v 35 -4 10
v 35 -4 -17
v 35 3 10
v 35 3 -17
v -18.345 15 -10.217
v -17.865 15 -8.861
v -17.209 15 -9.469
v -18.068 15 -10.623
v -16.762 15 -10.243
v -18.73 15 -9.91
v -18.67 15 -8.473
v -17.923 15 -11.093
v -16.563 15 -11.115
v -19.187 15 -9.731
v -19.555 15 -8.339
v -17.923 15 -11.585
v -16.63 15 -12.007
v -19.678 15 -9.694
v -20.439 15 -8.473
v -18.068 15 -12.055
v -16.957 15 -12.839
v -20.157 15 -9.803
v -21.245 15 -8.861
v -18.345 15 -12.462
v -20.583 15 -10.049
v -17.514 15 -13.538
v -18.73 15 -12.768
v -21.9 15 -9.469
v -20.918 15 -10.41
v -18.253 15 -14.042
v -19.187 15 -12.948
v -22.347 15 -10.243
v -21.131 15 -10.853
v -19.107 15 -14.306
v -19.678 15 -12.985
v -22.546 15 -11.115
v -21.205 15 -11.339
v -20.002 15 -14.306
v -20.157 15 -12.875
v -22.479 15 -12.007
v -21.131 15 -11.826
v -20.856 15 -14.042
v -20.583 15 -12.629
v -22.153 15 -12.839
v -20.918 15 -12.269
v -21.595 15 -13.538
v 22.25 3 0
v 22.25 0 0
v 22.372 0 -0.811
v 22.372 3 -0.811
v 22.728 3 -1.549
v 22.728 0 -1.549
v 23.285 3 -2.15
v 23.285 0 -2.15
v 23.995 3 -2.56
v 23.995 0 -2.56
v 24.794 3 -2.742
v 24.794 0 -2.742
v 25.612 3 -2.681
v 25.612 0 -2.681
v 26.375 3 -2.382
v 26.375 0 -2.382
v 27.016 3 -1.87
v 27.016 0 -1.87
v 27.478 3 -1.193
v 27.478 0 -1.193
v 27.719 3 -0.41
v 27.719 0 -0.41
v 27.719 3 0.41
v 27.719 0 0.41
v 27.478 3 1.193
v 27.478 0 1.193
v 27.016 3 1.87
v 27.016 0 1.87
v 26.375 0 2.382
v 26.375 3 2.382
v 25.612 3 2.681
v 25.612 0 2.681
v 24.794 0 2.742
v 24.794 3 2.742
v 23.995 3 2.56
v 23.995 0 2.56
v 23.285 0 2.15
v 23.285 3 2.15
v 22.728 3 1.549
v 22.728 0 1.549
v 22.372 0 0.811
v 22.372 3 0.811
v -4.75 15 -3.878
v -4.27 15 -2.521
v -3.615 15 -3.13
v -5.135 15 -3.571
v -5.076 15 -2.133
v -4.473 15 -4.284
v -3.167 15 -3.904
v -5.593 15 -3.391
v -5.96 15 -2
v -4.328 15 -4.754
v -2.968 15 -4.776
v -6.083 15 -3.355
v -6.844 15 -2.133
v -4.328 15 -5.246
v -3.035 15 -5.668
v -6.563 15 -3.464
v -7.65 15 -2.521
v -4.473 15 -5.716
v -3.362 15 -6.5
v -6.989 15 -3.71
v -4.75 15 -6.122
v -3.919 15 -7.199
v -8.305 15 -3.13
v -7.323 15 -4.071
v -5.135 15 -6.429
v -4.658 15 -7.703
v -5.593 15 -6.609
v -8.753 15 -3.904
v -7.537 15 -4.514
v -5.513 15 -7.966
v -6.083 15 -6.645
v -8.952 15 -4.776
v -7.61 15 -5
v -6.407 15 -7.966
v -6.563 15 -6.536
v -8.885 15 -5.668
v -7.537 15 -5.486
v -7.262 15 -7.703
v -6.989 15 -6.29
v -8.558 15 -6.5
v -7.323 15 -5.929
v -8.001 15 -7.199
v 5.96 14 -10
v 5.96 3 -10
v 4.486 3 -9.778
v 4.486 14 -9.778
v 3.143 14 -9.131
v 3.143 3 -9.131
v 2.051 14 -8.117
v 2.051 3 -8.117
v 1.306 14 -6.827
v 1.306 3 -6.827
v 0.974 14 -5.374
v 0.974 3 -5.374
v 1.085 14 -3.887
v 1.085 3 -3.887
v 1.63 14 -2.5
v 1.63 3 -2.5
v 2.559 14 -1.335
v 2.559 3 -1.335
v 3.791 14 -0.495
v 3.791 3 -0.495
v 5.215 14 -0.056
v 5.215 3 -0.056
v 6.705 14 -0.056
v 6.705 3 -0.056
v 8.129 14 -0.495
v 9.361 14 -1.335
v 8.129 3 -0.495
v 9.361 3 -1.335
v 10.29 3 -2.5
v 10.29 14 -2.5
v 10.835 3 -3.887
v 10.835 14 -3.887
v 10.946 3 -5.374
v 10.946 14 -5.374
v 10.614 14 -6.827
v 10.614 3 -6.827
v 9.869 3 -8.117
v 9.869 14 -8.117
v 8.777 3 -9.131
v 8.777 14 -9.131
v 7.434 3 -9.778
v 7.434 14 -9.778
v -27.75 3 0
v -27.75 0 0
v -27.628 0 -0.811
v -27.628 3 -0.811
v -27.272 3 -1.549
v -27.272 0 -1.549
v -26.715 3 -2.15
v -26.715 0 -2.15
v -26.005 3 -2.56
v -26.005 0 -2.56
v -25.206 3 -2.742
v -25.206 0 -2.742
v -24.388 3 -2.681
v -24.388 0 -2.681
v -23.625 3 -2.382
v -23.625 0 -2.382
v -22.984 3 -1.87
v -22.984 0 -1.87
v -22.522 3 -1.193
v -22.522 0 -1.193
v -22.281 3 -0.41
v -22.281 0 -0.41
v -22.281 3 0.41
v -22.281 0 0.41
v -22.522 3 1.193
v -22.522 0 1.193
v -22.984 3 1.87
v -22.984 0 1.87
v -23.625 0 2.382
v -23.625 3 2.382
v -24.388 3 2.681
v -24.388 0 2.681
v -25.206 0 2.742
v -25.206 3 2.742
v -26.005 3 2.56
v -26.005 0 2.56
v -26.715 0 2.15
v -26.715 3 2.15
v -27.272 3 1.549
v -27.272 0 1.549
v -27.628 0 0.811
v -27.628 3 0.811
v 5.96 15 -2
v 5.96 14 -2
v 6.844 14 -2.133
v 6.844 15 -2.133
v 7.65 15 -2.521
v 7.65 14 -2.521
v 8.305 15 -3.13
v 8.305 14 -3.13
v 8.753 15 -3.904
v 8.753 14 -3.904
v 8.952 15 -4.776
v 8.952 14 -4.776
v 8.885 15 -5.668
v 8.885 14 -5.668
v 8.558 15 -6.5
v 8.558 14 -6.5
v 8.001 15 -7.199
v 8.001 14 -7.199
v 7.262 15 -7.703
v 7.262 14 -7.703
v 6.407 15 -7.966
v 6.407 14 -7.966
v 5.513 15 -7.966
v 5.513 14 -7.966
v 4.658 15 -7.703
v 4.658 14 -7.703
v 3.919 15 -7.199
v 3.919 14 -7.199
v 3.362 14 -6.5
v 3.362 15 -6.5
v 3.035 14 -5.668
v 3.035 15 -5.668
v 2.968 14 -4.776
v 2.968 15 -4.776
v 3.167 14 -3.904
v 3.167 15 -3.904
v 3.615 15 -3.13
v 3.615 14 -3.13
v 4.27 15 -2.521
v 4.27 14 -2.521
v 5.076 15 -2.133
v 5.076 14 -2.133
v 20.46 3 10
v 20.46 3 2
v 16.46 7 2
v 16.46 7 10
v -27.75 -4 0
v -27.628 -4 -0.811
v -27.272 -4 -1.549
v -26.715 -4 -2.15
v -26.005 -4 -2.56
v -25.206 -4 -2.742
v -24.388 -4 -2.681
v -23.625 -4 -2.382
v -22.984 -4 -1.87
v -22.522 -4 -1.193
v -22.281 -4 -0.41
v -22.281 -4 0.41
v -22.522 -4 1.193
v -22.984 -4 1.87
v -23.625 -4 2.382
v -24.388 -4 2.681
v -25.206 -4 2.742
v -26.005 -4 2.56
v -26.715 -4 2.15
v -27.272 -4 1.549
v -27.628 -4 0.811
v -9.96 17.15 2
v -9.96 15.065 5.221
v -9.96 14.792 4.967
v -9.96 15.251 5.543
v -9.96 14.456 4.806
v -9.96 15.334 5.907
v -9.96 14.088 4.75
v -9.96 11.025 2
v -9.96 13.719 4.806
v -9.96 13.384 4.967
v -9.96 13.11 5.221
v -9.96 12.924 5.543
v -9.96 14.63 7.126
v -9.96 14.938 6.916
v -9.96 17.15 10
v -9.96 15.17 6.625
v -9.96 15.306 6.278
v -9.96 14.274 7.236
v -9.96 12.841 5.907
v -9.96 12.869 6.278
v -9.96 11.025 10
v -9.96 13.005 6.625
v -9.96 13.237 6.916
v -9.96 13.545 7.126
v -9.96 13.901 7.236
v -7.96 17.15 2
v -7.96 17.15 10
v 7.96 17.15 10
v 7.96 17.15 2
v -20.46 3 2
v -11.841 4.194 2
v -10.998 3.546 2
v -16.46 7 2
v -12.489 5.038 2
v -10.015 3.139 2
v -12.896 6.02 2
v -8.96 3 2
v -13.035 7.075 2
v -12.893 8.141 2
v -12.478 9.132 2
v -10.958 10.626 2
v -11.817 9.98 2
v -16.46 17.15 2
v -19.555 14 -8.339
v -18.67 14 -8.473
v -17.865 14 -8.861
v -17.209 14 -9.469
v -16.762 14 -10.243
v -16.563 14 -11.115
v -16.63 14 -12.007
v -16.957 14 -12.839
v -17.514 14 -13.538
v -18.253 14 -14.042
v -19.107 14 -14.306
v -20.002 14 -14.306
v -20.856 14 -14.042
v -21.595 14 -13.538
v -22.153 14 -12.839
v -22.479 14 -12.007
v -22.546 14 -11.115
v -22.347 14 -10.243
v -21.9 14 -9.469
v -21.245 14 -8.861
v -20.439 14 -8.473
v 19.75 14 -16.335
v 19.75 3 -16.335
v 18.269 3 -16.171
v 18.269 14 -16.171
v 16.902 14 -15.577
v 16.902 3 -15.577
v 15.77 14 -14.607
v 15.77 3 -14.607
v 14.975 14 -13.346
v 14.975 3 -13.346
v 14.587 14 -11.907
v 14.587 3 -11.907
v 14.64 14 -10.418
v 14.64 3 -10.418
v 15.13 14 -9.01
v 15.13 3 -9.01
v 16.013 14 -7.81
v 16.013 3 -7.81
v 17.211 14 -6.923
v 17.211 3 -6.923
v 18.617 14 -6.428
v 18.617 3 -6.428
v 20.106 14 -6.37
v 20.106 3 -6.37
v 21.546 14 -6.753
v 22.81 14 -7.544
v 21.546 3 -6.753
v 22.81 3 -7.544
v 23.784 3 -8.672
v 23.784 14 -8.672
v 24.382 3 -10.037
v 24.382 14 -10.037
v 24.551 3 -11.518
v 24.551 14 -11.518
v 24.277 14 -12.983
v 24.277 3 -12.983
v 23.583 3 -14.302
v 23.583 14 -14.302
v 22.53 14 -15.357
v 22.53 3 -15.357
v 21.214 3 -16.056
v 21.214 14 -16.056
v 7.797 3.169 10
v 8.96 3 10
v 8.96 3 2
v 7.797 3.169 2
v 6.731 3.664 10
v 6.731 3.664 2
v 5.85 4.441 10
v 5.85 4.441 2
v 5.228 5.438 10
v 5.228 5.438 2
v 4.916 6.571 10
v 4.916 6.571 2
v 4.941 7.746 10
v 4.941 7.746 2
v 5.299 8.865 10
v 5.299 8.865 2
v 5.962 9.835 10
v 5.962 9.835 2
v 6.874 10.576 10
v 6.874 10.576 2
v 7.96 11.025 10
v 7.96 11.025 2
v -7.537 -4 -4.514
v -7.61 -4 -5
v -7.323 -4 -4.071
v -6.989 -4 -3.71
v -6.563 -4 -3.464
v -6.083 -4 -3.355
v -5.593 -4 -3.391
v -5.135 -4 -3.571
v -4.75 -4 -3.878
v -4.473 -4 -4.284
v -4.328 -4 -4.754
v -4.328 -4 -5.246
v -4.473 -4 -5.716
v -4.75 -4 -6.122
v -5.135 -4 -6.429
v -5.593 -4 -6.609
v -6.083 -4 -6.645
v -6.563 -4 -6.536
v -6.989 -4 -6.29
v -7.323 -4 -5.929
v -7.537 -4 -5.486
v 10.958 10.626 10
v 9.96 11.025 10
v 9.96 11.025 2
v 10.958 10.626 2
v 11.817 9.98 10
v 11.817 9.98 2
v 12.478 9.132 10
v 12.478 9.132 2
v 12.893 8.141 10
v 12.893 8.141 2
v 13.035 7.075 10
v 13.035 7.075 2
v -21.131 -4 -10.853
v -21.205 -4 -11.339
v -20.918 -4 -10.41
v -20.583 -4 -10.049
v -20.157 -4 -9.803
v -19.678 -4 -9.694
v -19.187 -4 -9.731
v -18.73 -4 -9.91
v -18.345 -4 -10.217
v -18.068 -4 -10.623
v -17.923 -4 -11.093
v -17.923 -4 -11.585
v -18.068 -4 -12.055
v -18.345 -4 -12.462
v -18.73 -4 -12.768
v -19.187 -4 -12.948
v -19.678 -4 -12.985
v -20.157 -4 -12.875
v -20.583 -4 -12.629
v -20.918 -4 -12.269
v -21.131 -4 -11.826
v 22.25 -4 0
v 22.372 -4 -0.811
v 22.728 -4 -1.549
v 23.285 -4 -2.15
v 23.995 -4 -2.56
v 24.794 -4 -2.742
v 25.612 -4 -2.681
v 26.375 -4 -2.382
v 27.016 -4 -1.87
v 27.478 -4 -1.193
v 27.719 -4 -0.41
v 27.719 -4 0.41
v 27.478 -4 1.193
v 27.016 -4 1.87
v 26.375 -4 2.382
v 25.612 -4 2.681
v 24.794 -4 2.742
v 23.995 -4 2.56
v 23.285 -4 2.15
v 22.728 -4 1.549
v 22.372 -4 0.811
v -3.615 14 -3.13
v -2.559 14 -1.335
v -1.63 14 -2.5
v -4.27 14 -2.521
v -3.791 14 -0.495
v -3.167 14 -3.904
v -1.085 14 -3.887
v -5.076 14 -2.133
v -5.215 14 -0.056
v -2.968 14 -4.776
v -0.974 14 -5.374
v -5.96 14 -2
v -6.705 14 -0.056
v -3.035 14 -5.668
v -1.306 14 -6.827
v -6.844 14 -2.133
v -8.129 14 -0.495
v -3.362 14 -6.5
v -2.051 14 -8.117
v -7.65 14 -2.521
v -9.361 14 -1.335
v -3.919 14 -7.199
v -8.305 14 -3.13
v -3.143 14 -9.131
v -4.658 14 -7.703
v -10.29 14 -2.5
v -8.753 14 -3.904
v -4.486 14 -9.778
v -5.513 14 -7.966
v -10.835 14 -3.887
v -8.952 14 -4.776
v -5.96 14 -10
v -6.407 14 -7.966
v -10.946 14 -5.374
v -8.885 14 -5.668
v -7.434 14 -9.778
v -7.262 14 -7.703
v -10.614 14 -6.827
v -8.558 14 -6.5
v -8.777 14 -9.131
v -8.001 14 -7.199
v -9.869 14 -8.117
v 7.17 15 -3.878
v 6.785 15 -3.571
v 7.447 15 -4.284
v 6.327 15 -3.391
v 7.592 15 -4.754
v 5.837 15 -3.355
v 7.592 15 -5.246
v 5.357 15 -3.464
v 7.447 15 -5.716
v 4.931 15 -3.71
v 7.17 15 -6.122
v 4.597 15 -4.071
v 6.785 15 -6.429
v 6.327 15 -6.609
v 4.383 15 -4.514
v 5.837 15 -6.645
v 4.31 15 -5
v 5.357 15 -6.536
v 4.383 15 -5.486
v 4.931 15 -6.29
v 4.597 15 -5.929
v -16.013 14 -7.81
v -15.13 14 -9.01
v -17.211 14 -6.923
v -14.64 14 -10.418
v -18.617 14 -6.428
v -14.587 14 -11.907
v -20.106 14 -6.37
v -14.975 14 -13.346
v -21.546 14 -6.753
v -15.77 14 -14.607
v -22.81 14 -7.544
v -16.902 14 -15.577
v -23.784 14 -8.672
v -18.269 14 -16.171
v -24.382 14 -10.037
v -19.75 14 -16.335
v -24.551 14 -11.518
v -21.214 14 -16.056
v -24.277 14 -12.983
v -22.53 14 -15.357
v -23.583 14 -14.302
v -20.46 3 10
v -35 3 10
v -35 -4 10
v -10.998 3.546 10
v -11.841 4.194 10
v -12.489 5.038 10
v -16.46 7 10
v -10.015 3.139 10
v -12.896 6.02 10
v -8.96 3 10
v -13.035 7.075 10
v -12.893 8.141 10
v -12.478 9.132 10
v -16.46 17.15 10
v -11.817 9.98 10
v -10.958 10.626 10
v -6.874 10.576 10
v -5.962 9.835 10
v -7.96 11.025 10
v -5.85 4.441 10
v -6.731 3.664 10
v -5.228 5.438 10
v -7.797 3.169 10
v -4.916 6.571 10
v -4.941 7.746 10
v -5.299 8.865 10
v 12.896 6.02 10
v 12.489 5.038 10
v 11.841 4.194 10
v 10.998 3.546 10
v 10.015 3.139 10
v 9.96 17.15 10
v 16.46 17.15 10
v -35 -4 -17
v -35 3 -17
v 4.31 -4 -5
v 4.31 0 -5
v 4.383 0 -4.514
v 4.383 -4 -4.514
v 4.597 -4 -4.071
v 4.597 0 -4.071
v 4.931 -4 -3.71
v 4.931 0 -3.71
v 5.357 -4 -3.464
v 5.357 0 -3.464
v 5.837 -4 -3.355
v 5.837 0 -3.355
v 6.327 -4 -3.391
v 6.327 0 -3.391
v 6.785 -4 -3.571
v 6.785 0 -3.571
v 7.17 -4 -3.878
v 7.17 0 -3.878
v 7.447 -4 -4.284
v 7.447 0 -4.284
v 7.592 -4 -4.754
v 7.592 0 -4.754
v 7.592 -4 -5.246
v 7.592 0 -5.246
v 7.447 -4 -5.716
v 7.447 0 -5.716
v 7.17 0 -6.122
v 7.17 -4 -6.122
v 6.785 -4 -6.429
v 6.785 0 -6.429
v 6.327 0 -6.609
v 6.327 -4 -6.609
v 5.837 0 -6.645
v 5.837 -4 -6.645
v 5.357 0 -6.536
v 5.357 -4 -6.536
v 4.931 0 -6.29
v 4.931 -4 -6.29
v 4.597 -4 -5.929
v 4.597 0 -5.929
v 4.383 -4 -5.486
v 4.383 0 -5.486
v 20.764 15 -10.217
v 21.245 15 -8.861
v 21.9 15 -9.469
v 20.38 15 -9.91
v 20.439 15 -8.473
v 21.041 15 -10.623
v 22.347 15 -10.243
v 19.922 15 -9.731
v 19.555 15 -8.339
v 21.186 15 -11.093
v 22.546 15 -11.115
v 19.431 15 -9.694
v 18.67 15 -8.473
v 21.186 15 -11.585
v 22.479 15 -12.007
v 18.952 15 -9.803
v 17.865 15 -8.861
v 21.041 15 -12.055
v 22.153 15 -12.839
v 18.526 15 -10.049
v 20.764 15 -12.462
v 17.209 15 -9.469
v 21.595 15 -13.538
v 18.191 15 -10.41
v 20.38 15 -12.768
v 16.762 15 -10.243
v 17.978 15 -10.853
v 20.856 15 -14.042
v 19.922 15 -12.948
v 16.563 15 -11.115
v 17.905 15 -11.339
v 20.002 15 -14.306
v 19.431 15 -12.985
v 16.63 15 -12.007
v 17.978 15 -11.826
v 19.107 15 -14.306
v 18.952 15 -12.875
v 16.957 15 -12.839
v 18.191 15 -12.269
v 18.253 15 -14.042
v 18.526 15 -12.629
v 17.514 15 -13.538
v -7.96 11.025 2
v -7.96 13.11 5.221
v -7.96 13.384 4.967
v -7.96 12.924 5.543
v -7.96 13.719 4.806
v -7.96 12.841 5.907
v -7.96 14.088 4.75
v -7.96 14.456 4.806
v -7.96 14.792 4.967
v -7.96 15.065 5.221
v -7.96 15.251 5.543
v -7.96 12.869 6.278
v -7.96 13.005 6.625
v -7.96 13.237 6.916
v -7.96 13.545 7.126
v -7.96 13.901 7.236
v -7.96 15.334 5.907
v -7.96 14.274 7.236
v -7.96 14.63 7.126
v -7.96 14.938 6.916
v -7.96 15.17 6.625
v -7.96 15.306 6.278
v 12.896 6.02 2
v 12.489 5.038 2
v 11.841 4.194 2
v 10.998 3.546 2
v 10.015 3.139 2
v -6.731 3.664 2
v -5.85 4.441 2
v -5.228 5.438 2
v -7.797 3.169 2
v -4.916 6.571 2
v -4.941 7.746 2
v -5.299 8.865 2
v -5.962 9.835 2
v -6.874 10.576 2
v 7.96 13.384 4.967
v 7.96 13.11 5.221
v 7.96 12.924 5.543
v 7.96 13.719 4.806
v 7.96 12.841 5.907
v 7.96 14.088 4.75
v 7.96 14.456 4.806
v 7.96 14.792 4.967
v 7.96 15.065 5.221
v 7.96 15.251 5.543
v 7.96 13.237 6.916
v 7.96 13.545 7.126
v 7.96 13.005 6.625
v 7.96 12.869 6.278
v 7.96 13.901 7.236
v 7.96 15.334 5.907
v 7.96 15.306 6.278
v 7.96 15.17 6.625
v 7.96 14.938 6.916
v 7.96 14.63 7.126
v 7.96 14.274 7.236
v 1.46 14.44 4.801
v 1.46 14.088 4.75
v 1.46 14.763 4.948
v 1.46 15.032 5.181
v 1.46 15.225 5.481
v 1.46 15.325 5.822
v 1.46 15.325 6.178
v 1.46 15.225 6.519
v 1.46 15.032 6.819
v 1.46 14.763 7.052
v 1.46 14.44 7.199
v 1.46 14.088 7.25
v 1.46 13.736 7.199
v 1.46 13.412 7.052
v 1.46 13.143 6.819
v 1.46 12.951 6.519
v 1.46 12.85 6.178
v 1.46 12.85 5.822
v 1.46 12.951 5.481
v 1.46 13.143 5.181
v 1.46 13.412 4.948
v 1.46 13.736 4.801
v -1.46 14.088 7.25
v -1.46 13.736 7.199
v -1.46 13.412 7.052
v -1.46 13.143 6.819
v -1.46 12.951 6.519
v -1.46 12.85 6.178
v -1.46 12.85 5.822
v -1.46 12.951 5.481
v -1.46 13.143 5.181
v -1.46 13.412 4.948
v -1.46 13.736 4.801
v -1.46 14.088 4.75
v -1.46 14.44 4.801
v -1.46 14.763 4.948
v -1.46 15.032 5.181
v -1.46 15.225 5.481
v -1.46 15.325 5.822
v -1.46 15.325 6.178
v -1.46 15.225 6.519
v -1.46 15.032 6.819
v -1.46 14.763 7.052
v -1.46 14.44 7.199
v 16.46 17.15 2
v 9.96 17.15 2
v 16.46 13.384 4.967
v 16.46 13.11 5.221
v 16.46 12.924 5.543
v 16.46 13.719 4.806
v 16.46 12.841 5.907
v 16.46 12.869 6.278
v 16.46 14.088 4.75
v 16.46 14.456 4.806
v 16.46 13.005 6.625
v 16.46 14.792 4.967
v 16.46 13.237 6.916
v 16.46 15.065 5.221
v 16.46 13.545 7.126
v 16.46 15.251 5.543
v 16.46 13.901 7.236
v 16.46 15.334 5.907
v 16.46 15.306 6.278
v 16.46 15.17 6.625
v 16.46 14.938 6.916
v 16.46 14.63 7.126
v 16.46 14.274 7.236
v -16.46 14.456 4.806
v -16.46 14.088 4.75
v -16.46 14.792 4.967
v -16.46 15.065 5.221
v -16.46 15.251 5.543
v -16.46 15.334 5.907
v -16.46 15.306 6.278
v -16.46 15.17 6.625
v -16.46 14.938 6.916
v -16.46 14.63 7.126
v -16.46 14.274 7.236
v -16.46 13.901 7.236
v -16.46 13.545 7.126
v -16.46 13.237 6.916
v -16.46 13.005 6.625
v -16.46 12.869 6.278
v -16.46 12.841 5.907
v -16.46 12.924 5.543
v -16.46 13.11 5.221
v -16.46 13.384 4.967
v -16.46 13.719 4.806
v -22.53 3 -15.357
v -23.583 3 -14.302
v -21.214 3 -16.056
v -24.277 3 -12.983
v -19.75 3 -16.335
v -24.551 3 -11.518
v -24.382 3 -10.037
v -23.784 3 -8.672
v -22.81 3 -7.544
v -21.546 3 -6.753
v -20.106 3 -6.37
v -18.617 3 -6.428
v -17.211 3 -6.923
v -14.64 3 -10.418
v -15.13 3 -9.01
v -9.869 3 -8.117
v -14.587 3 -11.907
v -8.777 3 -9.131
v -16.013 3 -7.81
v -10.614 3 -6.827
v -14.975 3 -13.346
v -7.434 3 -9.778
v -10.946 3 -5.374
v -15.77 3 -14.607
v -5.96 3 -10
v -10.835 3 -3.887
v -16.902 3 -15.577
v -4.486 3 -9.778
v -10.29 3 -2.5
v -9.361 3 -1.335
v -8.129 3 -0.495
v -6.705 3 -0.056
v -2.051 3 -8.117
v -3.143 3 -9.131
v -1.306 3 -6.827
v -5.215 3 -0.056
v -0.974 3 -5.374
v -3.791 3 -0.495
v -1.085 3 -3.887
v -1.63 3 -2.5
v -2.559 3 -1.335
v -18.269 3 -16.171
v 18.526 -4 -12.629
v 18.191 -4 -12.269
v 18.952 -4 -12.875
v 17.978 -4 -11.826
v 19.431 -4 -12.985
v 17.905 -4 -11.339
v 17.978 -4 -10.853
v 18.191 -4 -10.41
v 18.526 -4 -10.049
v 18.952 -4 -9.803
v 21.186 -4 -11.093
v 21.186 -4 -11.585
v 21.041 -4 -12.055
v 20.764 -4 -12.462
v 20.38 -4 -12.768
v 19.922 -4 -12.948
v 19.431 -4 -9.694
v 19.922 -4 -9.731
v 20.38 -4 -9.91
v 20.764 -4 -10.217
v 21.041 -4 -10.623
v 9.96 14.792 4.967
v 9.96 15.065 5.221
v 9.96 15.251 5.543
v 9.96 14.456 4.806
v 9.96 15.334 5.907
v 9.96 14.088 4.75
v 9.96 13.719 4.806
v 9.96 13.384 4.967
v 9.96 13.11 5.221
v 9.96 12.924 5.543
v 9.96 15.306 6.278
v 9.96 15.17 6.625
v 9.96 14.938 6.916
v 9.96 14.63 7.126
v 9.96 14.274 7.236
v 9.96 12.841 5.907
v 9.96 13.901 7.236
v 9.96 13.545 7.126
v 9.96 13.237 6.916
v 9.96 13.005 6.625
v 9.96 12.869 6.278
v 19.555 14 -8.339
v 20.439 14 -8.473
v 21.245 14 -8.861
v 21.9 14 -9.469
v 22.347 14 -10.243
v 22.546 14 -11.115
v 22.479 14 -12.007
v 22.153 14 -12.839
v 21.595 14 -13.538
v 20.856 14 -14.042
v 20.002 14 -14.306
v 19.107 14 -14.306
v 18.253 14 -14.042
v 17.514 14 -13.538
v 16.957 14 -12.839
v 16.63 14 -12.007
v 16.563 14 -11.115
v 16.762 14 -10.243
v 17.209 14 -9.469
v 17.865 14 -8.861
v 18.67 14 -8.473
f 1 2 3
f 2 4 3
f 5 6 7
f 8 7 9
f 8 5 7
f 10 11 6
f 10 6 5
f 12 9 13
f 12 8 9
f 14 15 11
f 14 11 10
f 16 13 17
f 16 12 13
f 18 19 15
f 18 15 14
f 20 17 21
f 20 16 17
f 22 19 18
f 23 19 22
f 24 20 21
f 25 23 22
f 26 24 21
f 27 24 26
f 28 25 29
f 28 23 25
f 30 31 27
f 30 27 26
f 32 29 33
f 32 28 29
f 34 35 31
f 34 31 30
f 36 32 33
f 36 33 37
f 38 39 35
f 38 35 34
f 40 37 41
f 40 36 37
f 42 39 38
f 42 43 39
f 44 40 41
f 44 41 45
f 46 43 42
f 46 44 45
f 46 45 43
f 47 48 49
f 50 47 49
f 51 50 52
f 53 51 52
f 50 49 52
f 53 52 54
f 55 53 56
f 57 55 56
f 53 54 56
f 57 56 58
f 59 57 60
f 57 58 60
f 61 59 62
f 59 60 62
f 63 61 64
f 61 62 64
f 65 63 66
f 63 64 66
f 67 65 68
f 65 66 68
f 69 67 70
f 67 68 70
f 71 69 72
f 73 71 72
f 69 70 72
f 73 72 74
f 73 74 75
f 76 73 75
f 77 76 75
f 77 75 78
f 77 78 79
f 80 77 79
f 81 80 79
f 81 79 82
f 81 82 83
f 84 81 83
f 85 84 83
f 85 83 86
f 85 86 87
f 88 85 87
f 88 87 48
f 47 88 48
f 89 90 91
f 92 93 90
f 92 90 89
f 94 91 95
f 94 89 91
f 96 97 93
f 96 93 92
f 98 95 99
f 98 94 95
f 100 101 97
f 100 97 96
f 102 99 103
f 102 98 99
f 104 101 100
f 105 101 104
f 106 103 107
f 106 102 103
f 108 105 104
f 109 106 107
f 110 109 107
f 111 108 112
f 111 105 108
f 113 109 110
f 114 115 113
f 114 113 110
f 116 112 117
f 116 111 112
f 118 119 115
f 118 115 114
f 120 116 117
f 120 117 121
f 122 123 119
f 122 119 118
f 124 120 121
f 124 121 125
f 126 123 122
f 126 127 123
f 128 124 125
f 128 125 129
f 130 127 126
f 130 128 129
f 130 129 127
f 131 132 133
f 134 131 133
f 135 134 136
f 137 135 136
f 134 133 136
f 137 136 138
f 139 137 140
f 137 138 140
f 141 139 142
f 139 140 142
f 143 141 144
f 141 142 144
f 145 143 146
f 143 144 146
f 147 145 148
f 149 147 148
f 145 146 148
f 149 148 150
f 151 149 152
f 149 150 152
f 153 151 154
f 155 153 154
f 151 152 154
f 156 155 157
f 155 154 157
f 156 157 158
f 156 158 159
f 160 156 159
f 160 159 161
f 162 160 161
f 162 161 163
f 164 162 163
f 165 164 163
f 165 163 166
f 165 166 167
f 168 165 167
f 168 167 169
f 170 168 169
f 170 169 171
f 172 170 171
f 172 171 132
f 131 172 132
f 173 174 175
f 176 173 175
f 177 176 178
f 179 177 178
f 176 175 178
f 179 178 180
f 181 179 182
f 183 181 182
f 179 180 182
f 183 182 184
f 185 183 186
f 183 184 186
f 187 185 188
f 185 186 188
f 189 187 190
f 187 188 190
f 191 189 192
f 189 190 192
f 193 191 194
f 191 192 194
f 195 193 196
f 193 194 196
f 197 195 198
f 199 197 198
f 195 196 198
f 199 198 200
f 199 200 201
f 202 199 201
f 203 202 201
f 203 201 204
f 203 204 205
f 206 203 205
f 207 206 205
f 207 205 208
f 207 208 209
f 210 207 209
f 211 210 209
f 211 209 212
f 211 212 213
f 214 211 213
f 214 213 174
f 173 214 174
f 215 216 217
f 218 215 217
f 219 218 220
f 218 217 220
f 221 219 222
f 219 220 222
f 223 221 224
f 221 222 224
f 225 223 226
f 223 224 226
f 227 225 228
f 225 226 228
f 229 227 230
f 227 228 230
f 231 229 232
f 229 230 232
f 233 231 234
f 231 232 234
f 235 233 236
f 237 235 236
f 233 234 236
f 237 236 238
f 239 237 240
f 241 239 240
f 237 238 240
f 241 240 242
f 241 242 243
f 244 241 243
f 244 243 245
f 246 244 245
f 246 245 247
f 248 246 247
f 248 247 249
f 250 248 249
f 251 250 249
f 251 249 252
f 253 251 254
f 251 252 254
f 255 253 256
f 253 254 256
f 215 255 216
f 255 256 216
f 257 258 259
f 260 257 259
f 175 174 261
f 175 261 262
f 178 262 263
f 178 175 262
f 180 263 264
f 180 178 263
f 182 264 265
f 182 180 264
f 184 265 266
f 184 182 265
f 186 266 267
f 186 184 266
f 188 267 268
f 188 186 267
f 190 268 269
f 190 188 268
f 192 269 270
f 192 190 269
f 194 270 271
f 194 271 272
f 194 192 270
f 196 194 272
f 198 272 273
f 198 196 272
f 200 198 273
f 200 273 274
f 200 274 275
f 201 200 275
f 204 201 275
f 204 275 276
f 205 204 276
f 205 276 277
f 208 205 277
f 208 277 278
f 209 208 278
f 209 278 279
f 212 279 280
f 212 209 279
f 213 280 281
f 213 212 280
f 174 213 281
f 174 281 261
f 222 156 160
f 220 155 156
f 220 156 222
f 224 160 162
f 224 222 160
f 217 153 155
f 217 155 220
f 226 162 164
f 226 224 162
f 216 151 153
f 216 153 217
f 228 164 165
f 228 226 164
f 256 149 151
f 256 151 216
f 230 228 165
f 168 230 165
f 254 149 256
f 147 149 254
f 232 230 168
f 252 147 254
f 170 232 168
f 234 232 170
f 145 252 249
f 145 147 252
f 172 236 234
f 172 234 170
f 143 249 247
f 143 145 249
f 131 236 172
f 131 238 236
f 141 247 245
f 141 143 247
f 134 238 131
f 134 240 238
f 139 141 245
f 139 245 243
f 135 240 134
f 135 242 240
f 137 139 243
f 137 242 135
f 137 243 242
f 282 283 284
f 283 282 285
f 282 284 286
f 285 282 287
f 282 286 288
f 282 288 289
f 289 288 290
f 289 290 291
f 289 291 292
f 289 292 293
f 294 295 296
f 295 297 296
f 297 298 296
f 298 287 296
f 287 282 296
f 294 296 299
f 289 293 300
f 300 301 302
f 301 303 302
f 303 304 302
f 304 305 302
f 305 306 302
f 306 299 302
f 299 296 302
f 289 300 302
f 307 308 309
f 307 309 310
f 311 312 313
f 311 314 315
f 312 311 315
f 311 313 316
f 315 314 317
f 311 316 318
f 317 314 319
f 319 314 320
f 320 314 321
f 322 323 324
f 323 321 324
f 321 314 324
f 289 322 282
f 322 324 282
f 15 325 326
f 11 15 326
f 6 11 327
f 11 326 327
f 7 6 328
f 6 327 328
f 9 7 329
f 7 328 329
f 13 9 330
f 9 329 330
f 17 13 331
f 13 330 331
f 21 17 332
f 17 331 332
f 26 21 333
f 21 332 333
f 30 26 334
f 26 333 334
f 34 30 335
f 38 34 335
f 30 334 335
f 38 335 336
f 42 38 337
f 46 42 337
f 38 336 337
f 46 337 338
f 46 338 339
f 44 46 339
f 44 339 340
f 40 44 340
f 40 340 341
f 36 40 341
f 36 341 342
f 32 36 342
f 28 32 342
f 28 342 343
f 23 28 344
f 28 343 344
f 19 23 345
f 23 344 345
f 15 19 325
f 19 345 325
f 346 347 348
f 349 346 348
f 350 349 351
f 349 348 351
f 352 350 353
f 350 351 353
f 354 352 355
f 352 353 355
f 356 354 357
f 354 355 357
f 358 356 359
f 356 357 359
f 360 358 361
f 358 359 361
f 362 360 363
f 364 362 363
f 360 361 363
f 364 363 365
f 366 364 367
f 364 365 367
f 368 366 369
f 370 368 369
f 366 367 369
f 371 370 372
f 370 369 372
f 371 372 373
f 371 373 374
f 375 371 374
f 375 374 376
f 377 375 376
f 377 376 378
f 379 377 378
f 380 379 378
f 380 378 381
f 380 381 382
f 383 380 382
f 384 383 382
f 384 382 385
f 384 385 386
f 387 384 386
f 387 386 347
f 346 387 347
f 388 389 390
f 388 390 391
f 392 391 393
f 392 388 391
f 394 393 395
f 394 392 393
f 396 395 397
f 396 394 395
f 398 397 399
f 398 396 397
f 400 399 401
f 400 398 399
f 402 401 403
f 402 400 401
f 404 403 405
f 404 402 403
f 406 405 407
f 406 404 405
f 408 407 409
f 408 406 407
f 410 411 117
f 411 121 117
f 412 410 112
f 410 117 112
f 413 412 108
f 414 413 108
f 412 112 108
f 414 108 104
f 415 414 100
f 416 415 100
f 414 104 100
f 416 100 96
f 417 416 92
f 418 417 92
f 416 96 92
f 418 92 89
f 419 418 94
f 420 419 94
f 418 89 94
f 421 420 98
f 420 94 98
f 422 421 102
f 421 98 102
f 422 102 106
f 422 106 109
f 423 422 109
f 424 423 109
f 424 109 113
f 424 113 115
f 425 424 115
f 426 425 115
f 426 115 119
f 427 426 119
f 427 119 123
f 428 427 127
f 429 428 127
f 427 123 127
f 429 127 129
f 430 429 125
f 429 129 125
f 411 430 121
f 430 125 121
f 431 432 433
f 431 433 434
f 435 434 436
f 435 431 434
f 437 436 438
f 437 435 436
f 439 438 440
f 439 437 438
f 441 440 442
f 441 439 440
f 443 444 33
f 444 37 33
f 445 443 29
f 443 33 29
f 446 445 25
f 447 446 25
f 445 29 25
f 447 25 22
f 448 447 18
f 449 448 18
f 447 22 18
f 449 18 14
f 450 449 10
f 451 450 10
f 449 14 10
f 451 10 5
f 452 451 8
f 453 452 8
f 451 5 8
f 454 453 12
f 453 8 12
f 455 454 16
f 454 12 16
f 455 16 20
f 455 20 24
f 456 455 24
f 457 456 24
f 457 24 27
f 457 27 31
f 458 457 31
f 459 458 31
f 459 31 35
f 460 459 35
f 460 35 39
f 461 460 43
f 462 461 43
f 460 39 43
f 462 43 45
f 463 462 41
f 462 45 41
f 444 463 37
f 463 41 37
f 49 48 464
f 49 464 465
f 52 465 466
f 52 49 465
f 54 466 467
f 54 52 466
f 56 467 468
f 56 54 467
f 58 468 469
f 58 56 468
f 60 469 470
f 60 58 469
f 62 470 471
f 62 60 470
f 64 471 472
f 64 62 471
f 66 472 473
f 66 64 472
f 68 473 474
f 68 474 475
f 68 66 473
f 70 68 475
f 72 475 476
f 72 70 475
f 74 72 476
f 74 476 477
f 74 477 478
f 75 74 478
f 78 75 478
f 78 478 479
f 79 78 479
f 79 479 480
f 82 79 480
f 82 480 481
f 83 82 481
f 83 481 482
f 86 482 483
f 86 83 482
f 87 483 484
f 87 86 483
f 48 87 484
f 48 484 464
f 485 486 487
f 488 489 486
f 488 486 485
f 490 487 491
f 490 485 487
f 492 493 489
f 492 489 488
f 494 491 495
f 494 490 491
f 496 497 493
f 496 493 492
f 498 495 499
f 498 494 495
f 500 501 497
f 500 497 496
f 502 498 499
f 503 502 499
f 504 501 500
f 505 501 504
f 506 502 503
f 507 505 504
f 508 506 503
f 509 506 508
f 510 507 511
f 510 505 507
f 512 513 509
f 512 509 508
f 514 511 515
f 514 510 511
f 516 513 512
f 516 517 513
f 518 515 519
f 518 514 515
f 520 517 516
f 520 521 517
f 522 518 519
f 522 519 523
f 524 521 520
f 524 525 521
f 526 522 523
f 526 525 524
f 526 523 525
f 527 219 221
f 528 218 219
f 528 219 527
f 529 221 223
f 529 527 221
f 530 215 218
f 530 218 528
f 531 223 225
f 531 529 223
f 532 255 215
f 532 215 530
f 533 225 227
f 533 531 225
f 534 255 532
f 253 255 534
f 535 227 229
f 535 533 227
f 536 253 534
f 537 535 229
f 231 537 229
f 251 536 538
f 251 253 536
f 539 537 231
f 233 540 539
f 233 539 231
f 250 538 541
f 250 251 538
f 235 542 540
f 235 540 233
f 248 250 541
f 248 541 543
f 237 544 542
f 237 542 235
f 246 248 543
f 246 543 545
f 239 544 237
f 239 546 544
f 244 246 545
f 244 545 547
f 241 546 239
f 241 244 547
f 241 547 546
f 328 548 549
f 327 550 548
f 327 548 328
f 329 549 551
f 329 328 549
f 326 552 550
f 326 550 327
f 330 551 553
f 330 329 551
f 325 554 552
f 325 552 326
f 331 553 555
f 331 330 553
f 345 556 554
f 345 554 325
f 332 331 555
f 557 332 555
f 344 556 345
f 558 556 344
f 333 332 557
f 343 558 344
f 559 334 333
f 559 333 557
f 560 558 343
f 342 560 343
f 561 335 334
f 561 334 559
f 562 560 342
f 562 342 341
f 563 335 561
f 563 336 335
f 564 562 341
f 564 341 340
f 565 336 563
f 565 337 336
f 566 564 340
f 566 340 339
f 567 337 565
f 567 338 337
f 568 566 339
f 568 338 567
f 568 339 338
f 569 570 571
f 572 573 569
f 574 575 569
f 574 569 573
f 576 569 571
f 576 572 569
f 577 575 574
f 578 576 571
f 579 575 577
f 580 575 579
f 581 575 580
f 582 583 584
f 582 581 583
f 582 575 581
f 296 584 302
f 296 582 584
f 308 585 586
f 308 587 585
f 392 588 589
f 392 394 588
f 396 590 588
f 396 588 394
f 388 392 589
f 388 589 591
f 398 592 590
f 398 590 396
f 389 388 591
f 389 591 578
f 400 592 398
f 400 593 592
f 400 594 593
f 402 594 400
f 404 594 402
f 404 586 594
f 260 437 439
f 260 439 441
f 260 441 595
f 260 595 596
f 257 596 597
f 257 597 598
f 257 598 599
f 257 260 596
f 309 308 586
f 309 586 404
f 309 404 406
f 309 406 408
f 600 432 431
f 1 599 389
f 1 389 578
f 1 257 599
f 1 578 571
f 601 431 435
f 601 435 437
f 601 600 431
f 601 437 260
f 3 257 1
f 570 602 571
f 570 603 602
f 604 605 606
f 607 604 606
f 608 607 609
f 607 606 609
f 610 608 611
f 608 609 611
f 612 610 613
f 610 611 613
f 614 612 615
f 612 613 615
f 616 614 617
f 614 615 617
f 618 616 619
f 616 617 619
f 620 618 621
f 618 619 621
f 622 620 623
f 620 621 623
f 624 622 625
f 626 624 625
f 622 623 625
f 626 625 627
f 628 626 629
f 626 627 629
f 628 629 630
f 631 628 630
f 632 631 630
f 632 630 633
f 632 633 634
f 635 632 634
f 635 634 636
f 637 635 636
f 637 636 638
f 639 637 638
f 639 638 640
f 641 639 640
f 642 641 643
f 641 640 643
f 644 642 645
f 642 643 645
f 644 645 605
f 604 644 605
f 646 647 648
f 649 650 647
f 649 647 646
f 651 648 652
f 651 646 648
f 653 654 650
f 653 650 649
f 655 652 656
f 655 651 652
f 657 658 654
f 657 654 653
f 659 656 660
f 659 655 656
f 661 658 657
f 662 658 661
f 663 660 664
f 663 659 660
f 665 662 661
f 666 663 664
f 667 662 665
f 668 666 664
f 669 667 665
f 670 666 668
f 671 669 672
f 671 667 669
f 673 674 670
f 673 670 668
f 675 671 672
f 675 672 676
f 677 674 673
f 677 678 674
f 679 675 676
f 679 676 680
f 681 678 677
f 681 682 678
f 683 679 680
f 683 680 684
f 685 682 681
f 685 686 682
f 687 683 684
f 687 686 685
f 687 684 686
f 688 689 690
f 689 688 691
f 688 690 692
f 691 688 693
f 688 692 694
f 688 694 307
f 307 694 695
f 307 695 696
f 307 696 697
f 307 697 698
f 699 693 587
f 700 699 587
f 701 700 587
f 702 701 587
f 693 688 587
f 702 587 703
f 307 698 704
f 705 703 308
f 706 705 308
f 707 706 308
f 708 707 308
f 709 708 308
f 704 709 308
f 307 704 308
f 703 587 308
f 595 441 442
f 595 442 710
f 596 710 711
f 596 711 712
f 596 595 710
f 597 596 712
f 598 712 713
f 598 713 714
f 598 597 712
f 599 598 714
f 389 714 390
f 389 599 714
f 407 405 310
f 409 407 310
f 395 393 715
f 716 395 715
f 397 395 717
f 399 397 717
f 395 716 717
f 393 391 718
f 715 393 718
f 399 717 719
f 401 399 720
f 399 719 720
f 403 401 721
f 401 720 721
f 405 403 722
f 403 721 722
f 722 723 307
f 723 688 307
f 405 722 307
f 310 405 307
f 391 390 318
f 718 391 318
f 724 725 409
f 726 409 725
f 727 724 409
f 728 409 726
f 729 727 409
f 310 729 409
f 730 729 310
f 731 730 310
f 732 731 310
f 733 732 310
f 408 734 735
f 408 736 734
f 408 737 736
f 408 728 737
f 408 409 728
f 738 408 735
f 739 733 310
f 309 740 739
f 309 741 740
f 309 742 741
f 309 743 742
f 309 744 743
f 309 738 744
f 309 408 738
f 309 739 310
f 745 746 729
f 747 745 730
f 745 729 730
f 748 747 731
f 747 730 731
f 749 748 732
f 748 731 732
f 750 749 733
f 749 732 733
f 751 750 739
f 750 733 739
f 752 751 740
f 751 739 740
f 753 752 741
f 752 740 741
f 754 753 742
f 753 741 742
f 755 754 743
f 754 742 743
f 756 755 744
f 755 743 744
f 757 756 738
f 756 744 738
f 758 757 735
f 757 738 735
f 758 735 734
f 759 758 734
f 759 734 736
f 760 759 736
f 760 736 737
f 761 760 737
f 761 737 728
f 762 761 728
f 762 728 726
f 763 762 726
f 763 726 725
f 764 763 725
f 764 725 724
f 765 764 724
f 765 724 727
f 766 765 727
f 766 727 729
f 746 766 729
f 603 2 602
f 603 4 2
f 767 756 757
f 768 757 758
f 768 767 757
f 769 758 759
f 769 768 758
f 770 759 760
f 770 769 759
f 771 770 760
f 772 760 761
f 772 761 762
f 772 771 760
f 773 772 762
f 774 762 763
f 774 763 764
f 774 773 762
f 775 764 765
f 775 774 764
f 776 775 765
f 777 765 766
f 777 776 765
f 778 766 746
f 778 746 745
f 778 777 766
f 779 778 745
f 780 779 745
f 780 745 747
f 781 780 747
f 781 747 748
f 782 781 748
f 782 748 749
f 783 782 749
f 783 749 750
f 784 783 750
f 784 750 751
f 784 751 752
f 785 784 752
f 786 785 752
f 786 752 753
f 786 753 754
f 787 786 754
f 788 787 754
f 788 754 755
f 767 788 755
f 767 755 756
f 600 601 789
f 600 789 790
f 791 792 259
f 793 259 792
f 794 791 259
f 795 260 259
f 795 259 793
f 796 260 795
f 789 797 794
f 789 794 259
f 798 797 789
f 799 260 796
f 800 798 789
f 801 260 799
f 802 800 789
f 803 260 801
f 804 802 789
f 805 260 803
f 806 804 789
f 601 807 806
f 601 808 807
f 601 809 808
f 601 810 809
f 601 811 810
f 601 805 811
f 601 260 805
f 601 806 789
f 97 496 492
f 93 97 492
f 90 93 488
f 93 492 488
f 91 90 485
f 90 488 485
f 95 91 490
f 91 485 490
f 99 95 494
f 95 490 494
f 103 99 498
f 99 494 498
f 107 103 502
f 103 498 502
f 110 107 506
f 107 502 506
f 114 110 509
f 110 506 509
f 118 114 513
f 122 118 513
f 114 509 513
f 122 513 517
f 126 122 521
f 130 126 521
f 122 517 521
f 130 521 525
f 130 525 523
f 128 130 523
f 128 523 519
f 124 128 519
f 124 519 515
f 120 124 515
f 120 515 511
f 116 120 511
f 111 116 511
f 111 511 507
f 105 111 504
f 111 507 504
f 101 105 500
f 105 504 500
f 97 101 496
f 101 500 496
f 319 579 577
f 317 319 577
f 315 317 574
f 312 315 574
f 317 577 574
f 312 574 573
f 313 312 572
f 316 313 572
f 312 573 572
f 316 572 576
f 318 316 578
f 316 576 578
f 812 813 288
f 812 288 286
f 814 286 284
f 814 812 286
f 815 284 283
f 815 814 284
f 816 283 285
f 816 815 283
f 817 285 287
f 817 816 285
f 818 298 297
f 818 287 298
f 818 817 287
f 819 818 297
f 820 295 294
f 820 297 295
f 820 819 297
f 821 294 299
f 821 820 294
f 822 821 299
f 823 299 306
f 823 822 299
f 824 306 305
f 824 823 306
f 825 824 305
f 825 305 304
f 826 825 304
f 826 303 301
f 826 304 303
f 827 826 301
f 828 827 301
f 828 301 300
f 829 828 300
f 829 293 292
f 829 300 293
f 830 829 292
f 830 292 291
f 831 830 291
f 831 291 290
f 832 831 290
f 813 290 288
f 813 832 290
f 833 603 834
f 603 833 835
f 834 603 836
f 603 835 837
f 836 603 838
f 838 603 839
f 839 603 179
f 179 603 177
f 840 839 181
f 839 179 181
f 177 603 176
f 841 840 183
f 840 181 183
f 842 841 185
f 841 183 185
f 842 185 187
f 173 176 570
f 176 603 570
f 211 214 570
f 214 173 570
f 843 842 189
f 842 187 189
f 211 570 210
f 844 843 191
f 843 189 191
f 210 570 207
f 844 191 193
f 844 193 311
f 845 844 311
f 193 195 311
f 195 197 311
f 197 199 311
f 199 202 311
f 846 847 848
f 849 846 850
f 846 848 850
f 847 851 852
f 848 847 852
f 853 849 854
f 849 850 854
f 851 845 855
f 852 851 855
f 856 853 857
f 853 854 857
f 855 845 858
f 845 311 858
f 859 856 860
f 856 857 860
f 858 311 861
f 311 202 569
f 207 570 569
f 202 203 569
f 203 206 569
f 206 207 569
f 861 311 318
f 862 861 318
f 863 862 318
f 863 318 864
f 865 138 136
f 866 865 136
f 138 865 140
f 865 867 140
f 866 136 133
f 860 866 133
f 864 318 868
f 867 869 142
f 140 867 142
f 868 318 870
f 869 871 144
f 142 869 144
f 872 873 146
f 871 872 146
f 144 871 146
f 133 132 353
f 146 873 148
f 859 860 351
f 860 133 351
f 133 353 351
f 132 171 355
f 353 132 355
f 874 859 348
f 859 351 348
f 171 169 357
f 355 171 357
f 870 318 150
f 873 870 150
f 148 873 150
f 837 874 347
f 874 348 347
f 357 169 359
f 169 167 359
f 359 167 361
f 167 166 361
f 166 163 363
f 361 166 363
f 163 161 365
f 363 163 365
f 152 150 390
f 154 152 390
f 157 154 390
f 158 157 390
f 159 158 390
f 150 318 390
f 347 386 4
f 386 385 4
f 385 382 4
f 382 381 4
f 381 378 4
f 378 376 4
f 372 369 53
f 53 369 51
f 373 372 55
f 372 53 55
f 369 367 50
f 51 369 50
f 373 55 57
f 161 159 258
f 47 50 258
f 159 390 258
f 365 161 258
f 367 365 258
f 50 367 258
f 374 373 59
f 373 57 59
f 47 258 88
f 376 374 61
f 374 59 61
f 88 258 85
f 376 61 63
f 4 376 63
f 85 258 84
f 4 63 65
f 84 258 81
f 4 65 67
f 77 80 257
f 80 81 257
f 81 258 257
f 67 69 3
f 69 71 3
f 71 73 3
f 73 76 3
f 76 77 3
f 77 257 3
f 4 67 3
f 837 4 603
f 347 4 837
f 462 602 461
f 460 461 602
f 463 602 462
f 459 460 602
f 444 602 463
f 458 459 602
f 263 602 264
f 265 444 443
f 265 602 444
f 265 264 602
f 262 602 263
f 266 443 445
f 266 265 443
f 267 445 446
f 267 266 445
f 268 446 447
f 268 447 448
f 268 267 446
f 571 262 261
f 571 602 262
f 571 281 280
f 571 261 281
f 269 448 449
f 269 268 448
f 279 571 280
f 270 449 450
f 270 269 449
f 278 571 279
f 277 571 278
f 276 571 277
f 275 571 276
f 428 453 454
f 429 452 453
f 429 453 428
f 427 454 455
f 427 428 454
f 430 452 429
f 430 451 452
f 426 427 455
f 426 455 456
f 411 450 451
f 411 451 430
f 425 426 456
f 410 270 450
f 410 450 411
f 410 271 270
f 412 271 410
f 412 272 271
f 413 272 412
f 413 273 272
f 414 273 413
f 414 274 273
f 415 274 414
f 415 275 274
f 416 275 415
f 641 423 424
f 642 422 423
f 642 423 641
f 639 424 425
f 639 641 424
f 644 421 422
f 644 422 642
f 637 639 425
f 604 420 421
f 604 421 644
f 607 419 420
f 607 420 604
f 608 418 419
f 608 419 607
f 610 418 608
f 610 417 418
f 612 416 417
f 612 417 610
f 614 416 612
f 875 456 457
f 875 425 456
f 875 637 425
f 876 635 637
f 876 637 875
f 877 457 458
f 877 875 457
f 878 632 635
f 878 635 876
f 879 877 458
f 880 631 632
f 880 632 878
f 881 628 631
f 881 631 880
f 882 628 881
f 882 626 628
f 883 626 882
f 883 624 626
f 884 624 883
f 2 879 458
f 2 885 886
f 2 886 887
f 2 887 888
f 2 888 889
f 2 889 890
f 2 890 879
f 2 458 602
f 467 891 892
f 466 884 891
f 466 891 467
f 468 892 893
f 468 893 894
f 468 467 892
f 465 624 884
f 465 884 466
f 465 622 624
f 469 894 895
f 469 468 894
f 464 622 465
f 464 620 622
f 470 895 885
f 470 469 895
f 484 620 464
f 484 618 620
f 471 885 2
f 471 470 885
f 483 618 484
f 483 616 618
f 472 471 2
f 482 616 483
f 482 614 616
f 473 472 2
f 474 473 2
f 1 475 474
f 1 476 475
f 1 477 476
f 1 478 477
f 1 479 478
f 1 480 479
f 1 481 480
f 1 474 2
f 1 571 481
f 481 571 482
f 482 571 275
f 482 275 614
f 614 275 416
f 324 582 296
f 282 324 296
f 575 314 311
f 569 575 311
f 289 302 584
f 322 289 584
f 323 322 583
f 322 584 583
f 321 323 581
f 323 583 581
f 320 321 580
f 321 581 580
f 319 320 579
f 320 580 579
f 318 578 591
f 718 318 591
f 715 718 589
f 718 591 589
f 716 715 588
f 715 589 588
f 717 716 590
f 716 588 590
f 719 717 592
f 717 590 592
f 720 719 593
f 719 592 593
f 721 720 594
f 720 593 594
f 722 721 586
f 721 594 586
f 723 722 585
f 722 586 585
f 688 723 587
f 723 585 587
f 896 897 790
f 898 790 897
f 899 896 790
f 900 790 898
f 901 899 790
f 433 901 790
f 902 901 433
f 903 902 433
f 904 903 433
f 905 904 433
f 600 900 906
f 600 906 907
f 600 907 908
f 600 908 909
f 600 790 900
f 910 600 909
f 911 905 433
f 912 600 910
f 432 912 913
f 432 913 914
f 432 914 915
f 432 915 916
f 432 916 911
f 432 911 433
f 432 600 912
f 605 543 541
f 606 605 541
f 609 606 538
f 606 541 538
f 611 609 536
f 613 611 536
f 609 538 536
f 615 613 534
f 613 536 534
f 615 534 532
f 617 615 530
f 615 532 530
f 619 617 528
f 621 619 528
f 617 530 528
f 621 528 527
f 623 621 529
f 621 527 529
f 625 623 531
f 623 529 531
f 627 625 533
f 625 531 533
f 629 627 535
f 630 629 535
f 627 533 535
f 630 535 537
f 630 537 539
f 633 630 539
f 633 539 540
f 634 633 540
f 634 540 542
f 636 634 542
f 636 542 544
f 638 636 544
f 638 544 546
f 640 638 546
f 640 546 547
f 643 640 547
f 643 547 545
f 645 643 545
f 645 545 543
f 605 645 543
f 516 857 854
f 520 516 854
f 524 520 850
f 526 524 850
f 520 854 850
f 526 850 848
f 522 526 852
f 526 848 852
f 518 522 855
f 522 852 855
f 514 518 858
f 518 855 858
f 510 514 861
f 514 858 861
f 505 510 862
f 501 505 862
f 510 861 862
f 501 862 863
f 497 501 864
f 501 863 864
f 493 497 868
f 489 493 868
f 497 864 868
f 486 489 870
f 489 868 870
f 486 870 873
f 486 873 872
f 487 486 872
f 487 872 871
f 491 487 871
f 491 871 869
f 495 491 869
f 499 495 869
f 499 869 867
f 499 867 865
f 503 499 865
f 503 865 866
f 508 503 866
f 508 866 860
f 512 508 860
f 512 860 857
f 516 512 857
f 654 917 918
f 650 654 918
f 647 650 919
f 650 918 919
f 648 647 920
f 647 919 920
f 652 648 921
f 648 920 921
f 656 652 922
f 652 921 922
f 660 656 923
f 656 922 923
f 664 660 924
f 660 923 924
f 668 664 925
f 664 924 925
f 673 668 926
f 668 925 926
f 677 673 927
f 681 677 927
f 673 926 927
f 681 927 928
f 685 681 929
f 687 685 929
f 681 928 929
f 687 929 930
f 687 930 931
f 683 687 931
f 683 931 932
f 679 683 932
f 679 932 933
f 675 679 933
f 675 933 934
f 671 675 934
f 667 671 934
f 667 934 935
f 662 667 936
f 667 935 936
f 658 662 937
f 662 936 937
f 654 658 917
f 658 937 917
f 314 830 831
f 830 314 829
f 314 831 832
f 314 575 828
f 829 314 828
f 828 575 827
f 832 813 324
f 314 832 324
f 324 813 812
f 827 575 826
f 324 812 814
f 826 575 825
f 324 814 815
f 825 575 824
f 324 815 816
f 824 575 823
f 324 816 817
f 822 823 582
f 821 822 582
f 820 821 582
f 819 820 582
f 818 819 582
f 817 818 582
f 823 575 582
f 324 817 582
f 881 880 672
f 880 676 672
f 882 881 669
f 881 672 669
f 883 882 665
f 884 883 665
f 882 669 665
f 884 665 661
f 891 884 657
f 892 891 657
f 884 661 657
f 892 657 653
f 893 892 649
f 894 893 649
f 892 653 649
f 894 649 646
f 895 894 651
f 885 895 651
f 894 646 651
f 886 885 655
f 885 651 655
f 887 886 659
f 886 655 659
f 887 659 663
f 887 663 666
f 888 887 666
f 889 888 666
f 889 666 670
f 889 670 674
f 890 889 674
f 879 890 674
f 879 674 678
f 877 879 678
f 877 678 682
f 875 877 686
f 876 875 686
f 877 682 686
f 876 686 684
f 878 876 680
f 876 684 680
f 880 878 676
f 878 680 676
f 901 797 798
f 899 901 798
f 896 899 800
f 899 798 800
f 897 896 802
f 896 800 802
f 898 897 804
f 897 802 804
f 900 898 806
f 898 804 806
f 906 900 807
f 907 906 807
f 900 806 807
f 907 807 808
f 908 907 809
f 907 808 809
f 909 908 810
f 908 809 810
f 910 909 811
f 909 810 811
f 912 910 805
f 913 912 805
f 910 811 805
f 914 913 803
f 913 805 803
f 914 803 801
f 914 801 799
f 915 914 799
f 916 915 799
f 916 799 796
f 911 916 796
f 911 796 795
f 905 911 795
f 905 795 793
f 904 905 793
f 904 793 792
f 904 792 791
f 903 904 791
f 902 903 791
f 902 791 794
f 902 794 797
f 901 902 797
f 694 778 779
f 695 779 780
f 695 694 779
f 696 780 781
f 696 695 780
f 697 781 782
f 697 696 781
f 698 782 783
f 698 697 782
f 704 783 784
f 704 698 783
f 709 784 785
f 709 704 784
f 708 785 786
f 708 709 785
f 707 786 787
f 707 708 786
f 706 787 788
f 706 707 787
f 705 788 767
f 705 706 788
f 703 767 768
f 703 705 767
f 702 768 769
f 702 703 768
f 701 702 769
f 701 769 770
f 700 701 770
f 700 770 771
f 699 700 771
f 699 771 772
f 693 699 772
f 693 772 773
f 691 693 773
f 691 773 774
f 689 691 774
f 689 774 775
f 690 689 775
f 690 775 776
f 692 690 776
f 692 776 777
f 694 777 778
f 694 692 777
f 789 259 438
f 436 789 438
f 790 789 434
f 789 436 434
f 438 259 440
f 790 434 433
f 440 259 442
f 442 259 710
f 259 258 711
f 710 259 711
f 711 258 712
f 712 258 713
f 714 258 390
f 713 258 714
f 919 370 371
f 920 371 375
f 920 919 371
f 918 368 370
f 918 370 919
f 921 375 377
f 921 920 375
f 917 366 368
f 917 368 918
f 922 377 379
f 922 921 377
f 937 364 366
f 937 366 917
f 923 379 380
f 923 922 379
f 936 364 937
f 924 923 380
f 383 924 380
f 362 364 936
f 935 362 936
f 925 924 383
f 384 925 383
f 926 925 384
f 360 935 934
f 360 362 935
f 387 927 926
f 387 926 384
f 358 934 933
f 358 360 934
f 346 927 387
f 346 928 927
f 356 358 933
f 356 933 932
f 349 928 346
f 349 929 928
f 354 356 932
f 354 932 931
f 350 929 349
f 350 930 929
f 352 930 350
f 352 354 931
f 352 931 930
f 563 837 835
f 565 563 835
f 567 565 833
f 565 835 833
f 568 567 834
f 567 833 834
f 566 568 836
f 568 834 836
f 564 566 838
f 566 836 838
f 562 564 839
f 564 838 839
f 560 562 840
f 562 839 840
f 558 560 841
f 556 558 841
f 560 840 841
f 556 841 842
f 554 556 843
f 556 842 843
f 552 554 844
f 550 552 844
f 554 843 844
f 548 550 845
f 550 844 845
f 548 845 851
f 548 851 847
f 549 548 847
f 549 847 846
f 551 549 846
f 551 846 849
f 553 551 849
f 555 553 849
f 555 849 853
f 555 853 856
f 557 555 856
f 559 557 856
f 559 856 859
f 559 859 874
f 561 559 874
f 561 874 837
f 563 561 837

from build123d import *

# Parameters (mm, degrees)
BOSS_EXTRUDE1_DEPTH      = 3
BOSS_EXTRUDE2_DEPTH      = 8
CHAMFER1_SIZE            = 4
M3X0_5_TAPPED_HOLE1_D    = 2.5
CHAMFER1_OF_MIRROR1_SIZE = 4
BOSS_EXTRUDE3_REACH      = 34.14
SKETCH7_W                = 8
SKETCH7_H                = 14.15
SKETCH7_R                = 1.25
SKETCH8_R                = 5
BOSS_EXTRUDE4_DEPTH      = 12
CUT_EXTRUDE1_START       = -1
SKETCH9_R                = 5
SKETCH9_R_2              = 3
CUT_EXTRUDE1_DEPTH       = 1
SKETCH12_W               = 15.25
SKETCH12_H               = 27
BOSS_EXTRUDE5_DEPTH      = 3
M4X0_7_TAPPED_HOLE1_D    = 3.3
M5_CLEARANCE_HOLE3_D     = 5.5
DELETEFACE1_START        = 2
DELETEFACE1_DEPTH        = 8
MOVE_FACE1_BY            = 4


# Read off the part's stored shape, not the designer's step: DeleteFace1
with BuildPart() as part:
    # Sketch1 → Boss-Extrude1 (new body)
    with BuildSketch(Plane(origin=(0, 0, 0), x_dir=(1, 0, 0), z_dir=(0, 1, 0))):
        Polygon((19.75, 10), (19.75, -10), (-19.75, -10), (-19.75, 10), (-19.75, 17), (19.75, 17), align=None)
    extrude(amount=BOSS_EXTRUDE1_DEPTH)

    # Sketch4 → Boss-Extrude2 (add)
    with BuildSketch(Plane.XY.offset(10)):
        with BuildLine():
            Line((1.46, 17.15), (1.46, 3))
            Line((1.46, 3), (8.960000005, 3))
            ThreePointArc((8.960000005, 3), (4.916271098, 6.571133381), (7.96, 11.02539555))
            Line((7.96, 11.02539555), (7.96, 17.15))
            Line((7.96, 17.15), (1.46, 17.15))
        make_face()
        with BuildLine():
            ThreePointArc((13.035, 7.075), (11.841460135, 4.193539869), (8.960000005, 3))
            Line((8.960000005, 3), (16.46, 3))
            Line((16.46, 3), (16.46, 17.15))
            Line((16.46, 17.15), (9.96, 17.15))
            Line((9.96, 17.15), (9.96, 11.02539555))
            ThreePointArc((9.96, 11.02539555), (12.175635629, 9.578060627), (13.035, 7.075))
        make_face()
    boss_extrude2 = extrude(amount=-BOSS_EXTRUDE2_DEPTH)

    # Chamfer1
    # the kernel refuses this chamfer: 4 mm, written as the material it adds along each edge
    with BuildSketch(Plane(origin=(16.46, 3, 10), x_dir=(0.9996219169112968, -0.027495876610586917, 0), z_dir=(0, 0, -1))) as chamfer1_piece_1_section:
        Polygon((CHAMFER1_SIZE * 0.999621916911, -CHAMFER1_SIZE * 0.0274958766106), (-CHAMFER1_SIZE * 0.0274958766106, -CHAMFER1_SIZE * 0.999621916911), (0, 0), align=None)
    chamfer1_piece_1 = extrude(amount=8, mode=Mode.PRIVATE)
    chamfer1_piece_1 = split(chamfer1_piece_1, bisect_by=Plane(origin=(19.75, 4.372732245, 6), z_dir=(-1, 0, 0)), keep=Keep.TOP, mode=Mode.PRIVATE)
    add(chamfer1_piece_1)

    # M3x0.5 Tapped Hole1 (through all)
    with Locations(Plane.ZY.offset(-1.46)):
        with Locations((6, 14.087697775)):
            m3x0_5_tapped_hole1 = Hole(M3X0_5_TAPPED_HOLE1_D / 2)

    # Mirror1: Boss-Extrude2, M3x0.5 Tapped Hole1 across plane
    add(boss_extrude2.mirror(Plane(origin=(0, 0, 0), x_dir=(0, 0, 1), z_dir=(1, 0, 0))))
    add(m3x0_5_tapped_hole1.mirror(Plane(origin=(0, 0, 0), x_dir=(0, 0, 1), z_dir=(1, 0, 0))), mode=Mode.SUBTRACT)

    # Chamfer1 of Mirror1
    # the kernel refuses this chamfer: 4 mm, written as the material it adds along each edge
    with BuildSketch(Plane(origin=(-16.46, 3, 10), x_dir=(-0.9996219169112968, -0.027495876610586917, 0), z_dir=(0, 0, -1))) as chamfer1_of_mirror1_piece_1_section:
        Polygon((CHAMFER1_OF_MIRROR1_SIZE * 0.999621916911, CHAMFER1_OF_MIRROR1_SIZE * 0.0274958766106), (-CHAMFER1_OF_MIRROR1_SIZE * 0.0274958766106, CHAMFER1_OF_MIRROR1_SIZE * 0.999621916911), (0, 0), align=None)
    chamfer1_of_mirror1_piece_1 = extrude(amount=8, mode=Mode.PRIVATE)
    chamfer1_of_mirror1_piece_1 = split(chamfer1_of_mirror1_piece_1, bisect_by=Plane(origin=(-19.75, 4.372732245, 6), z_dir=(1, 0, 0)), keep=Keep.TOP, mode=Mode.PRIVATE)
    add(chamfer1_of_mirror1_piece_1)

    # Sketch7 → Boss-Extrude3 (add, up to next)
    with BuildSketch(Plane(origin=(-1.46, 0, 0), x_dir=(0, 0, -1), z_dir=(1, 0, 0)), mode=Mode.PRIVATE) as boss_extrude3_sk1:
        with Locations((-6, 10.075)):
            Rectangle(SKETCH7_W, SKETCH7_H)
        with Locations(Location((-6, 14.087697775, 0), (0, 0, 180))):
            Circle(SKETCH7_R, mode=Mode.SUBTRACT)
    boss_extrude3_tool1 = extrude(boss_extrude3_sk1.sketch, amount=BOSS_EXTRUDE3_REACH, mode=Mode.PRIVATE) - part.part
    add(boss_extrude3_tool1.solids().sort_by_distance((-1.46, 9.893108, 6))[0])

    # Sketch8 → Boss-Extrude4 (add)
    with BuildSketch(Plane(origin=(0, 3, 0), x_dir=(1, 0, 0), z_dir=(0, 1, 0))):
        with Locations(Location((-5.96, 5, 0), (0, 0, 90))):
            Circle(SKETCH8_R)
        with Locations(Location((5.96, 5, 0), (0, 0, 90))):
            Circle(SKETCH8_R)
        with Locations(Location((-19.554616806, 11.339273926, 0), (0, 0, 92.239496679))):
            Circle(SKETCH8_R)
        with Locations(Location((19.554616806, 11.339273926, 0), (0, 0, 87.760503321))):
            Circle(SKETCH8_R)
    extrude(amount=BOSS_EXTRUDE4_DEPTH)

    # Sketch9 → Cut-Extrude1 (cut)
    # profile 1 of 4: a face of its own
    with BuildSketch(Plane(origin=(0, 15, 0), x_dir=(1, 0, 0), z_dir=(0, 1, 0)).offset(CUT_EXTRUDE1_START)):
        with Locations(Location((5.96, 5, 0), (0, 0, 90))):
            Circle(SKETCH9_R)
        with Locations(Location((5.96, 5, 0), (0, 0, 270))):
            Circle(SKETCH9_R_2, mode=Mode.SUBTRACT)
    # profile 2 of 4: a face of its own
    with BuildSketch(Plane(origin=(0, 15, 0), x_dir=(1, 0, 0), z_dir=(0, 1, 0)).offset(CUT_EXTRUDE1_START)):
        with Locations(Location((-5.96, 5, 0), (0, 0, 90))):
            Circle(SKETCH9_R)
        with Locations(Location((-5.96, 5, 0), (0, 0, 270))):
            Circle(SKETCH9_R_2, mode=Mode.SUBTRACT)
    # profile 3 of 4: a face of its own
    with BuildSketch(Plane(origin=(0, 15, 0), x_dir=(1, 0, 0), z_dir=(0, 1, 0)).offset(CUT_EXTRUDE1_START)):
        with Locations(Location((-19.554616806, 11.339273926, 0), (0, 0, 92.239496679))):
            Circle(SKETCH9_R)
        with Locations(Location((-19.554616806, 11.339273926, 0), (0, 0, 270))):
            Circle(SKETCH9_R_2, mode=Mode.SUBTRACT)
    # profile 4 of 4: a face of its own
    with BuildSketch(Plane(origin=(0, 15, 0), x_dir=(1, 0, 0), z_dir=(0, 1, 0)).offset(CUT_EXTRUDE1_START)):
        with Locations(Location((19.554616806, 11.339273926, 0), (0, 0, 87.760503321))):
            Circle(SKETCH9_R)
        with Locations(Location((19.554616806, 11.339273926, 0), (0, 0, 270))):
            Circle(SKETCH9_R_2, mode=Mode.SUBTRACT)
    extrude(amount=CUT_EXTRUDE1_DEPTH, mode=Mode.SUBTRACT)

    # Sketch12 → Boss-Extrude5 (add)
    with BuildSketch(Plane.XZ):
        with Locations((-27.375, -3.5)):
            Rectangle(SKETCH12_W, SKETCH12_H)
        with Locations((27.375, -3.5)):
            Rectangle(SKETCH12_W, SKETCH12_H)
    extrude(amount=-BOSS_EXTRUDE5_DEPTH)

    # M4x0.7 Tapped Hole1 (through all)
    with Locations(Plane.XZ):
        with Locations((-5.96, -5), (5.96, -5), (-19.554616806, -11.339273926), (19.554616806, -11.339273926)):
            Hole(M4X0_7_TAPPED_HOLE1_D / 2)

    # M5 Clearance Hole3 (through all)
    with Locations(Plane(origin=(0, 3, 0), x_dir=(1, 0, 0), z_dir=(0, 1, 0))):
        with Locations((25, 0), (-25, 0)):
            Hole(M5_CLEARANCE_HOLE3_D / 2)

    # DeleteFace1 outline → DeleteFace1 (add)
    with BuildSketch(Plane.XY.offset(DELETEFACE1_START)):
        Polygon((-20.46, 3), (-19.75, 3), (-19.75, 3.71), align=None)
        Polygon((20.46, 3), (19.75, 3.71), (19.75, 3), align=None)
    extrude(amount=DELETEFACE1_DEPTH)

    # Move Face1: a face moved outward by 4.0
    extrude(part.faces().sort_by_distance((0, 0, -3.503622632))[0], amount=MOVE_FACE1_BY, dir=(0, -1, 0))


solid = part.part
